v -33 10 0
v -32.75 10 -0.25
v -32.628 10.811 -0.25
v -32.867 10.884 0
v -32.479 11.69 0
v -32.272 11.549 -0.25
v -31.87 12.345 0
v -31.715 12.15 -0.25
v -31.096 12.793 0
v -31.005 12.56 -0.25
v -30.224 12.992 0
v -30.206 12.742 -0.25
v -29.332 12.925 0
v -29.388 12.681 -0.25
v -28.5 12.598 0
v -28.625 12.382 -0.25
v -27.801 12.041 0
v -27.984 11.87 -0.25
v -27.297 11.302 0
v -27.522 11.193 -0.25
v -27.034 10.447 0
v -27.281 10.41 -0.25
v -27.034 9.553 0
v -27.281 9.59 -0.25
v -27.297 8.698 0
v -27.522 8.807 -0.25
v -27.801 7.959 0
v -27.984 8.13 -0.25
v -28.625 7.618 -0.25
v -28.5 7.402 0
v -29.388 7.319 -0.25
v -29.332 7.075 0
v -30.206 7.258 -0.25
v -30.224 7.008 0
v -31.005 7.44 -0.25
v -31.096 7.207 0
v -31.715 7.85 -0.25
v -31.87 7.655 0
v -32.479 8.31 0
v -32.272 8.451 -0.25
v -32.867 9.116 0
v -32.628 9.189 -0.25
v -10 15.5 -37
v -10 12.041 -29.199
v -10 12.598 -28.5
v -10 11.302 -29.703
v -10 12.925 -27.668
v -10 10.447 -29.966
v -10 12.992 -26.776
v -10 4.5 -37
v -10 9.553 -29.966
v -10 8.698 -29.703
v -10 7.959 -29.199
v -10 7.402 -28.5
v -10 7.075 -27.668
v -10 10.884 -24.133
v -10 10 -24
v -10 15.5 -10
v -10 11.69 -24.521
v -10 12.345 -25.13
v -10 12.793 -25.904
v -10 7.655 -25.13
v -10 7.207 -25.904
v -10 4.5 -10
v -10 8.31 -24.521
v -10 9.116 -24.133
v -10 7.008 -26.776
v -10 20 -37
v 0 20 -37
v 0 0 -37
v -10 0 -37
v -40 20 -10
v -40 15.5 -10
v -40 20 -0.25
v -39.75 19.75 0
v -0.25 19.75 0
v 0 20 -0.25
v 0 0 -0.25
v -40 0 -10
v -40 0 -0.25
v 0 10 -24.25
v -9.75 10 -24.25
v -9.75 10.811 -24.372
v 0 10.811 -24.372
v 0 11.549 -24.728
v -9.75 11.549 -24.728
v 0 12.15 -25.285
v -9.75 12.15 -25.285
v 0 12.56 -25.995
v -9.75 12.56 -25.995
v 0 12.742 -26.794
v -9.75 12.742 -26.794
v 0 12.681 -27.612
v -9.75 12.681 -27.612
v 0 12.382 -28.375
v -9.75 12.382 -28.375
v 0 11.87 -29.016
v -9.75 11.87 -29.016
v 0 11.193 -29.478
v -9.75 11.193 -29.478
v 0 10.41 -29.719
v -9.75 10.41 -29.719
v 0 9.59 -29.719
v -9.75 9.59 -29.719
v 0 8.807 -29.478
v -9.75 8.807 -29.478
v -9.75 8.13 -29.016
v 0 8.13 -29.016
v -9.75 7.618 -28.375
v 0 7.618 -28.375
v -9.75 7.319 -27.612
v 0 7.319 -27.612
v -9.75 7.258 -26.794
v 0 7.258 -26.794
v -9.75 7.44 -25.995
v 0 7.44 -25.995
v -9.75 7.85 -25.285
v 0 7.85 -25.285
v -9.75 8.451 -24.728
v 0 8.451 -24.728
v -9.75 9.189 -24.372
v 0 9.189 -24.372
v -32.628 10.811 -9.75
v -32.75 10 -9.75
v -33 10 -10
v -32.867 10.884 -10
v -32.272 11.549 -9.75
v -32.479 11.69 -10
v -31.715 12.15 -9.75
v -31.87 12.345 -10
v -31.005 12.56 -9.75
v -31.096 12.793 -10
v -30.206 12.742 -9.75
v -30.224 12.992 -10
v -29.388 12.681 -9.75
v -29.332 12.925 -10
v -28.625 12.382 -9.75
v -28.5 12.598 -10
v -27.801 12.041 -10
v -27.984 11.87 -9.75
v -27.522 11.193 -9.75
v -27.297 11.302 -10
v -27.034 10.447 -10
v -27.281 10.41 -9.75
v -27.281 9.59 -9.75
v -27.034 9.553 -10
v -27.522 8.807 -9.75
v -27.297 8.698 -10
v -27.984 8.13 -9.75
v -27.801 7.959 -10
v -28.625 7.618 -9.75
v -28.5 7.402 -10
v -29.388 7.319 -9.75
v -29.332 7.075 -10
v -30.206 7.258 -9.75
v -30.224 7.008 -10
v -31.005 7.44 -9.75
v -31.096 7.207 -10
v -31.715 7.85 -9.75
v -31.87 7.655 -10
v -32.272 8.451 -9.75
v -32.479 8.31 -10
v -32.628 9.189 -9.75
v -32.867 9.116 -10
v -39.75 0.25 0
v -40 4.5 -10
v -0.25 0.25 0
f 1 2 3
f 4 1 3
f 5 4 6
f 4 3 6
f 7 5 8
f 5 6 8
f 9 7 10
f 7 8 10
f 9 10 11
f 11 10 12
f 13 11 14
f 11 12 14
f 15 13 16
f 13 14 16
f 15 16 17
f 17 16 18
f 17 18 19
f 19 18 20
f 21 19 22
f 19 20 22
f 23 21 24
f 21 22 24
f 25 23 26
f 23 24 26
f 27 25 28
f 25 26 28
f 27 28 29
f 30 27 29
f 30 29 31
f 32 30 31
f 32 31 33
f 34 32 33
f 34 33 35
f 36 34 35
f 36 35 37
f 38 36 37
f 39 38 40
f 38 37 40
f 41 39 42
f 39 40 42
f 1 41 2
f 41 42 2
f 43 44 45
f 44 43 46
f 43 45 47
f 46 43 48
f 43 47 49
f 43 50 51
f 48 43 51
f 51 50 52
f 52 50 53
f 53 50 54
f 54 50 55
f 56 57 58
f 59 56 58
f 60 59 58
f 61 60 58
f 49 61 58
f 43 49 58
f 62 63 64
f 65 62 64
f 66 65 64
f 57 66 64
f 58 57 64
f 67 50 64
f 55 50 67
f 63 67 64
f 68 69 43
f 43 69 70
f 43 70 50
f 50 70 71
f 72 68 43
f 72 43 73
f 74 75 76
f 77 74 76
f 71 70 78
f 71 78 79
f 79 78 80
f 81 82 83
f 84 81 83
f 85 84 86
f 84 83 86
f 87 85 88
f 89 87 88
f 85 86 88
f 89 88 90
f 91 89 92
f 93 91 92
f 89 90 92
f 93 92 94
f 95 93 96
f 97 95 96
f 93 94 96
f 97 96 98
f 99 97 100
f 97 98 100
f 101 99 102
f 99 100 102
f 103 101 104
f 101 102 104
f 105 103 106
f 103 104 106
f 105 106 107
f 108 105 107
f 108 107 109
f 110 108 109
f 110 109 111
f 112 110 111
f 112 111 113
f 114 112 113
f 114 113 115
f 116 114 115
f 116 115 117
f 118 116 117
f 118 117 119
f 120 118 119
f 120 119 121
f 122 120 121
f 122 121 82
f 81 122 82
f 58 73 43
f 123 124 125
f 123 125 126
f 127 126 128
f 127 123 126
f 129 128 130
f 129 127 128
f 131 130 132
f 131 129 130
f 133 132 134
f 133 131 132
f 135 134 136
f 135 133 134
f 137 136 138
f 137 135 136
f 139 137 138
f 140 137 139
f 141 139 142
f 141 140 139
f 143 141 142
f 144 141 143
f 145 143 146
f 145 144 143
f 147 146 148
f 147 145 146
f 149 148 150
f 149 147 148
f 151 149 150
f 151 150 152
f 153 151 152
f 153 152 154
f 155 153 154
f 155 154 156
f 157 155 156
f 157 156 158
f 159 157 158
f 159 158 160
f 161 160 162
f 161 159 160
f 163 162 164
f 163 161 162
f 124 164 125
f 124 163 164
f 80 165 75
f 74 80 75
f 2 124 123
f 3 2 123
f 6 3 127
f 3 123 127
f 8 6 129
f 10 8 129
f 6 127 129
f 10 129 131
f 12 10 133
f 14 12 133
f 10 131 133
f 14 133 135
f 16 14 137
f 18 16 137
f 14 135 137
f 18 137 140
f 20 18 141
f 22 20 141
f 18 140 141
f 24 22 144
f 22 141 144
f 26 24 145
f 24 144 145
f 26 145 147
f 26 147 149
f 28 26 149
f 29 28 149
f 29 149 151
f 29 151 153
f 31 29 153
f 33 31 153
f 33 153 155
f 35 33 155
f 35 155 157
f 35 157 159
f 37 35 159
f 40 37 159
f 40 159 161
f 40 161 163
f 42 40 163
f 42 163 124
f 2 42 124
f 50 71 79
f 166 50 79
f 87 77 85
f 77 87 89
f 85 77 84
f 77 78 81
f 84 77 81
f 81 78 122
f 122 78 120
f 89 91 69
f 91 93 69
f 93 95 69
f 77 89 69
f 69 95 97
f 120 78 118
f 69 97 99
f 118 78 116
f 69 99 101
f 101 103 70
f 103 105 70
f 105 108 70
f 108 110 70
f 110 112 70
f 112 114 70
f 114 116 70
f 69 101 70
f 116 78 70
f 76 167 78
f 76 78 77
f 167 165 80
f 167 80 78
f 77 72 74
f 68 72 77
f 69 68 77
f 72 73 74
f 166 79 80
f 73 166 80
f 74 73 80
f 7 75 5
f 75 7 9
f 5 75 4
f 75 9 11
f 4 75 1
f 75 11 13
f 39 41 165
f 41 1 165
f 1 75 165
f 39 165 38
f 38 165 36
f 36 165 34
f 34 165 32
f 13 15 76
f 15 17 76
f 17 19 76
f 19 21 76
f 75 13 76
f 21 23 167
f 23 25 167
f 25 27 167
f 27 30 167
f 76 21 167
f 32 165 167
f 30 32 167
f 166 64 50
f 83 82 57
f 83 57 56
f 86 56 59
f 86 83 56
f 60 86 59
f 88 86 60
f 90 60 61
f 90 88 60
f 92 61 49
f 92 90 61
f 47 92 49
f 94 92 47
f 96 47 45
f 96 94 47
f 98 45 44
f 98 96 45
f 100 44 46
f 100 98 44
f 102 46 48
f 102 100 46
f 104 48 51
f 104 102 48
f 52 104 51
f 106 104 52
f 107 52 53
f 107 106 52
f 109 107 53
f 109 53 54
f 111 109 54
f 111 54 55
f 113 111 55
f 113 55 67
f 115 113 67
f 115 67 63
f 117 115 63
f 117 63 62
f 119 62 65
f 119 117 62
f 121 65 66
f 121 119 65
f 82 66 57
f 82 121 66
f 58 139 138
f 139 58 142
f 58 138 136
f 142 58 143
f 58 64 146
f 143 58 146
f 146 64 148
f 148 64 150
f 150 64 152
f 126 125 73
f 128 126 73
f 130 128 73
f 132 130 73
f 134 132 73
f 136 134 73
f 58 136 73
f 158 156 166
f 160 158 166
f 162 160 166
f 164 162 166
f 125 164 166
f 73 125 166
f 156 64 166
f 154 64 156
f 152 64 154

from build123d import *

# Parameters (mm, degrees)
BOSS_EXTRUDE1_DEPTH = 20
SKETCH2_R           = 2.75
CUT_EXTRUDE1_DEPTH  = 20
SKETCH3_R           = 2.75
CUT_EXTRUDE2_DEPTH  = 20
BOSS_EXTRUDE2_DEPTH = 4.5
BOSS_EXTRUDE3_DEPTH = 4.5
CHAMFER1_SIZE       = 0.25


with BuildPart() as part:
    # Sketch1 → Boss-Extrude1 (new body)
    with BuildSketch(Plane(origin=(0, 0, 0), x_dir=(1, 0, 0), z_dir=(0, 1, 0))):
        Polygon((0, 37), (-10, 37), (-10, 10), (-40, 10), (-40, 0), (0, 0), align=None)
    extrude(amount=BOSS_EXTRUDE1_DEPTH)

    # Sketch2 → Cut-Extrude1 (cut)
    with BuildSketch(Plane.ZY.offset(10)):
        with Locations((-27, 10)):
            Circle(SKETCH2_R)
    extrude(amount=-CUT_EXTRUDE1_DEPTH, mode=Mode.SUBTRACT)

    # Sketch3 → Cut-Extrude2 (cut)
    with BuildSketch(Plane(origin=(0, 0, -10), x_dir=(-1, 0, 0), z_dir=(0, 0, -1))):
        with Locations((30, 10)):
            Circle(SKETCH3_R)
    extrude(amount=-CUT_EXTRUDE2_DEPTH, mode=Mode.SUBTRACT)

    # Sketch4 → Boss-Extrude2 (add)
    with BuildSketch(Plane.XZ):
        Polygon((-40, -10), (-10, -10), (-10, -37), align=None)
    extrude(amount=-BOSS_EXTRUDE2_DEPTH)

    # Sketch5 → Boss-Extrude3 (add)
    with BuildSketch(Plane(origin=(0, 20, 0), x_dir=(1, 0, 0), z_dir=(0, 1, 0))):
        Polygon((-40, 10), (-10, 10), (-10, 37), align=None)
    extrude(amount=-BOSS_EXTRUDE3_DEPTH)

    # Chamfer1
    chamfer1_edges = [part.edges().sort_by_distance(p)[0] for p in [
        (0, 10, 0),
        (-40, 10, 0),
        (-10, 10, -29.75),
        (-20, 20, 0),
        (-27.25, 10, 0),
        (-27.25, 10, -10),
        (-20, 0, 0),
    ]]
    chamfer(chamfer1_edges, length=CHAMFER1_SIZE)


solid = part.part
